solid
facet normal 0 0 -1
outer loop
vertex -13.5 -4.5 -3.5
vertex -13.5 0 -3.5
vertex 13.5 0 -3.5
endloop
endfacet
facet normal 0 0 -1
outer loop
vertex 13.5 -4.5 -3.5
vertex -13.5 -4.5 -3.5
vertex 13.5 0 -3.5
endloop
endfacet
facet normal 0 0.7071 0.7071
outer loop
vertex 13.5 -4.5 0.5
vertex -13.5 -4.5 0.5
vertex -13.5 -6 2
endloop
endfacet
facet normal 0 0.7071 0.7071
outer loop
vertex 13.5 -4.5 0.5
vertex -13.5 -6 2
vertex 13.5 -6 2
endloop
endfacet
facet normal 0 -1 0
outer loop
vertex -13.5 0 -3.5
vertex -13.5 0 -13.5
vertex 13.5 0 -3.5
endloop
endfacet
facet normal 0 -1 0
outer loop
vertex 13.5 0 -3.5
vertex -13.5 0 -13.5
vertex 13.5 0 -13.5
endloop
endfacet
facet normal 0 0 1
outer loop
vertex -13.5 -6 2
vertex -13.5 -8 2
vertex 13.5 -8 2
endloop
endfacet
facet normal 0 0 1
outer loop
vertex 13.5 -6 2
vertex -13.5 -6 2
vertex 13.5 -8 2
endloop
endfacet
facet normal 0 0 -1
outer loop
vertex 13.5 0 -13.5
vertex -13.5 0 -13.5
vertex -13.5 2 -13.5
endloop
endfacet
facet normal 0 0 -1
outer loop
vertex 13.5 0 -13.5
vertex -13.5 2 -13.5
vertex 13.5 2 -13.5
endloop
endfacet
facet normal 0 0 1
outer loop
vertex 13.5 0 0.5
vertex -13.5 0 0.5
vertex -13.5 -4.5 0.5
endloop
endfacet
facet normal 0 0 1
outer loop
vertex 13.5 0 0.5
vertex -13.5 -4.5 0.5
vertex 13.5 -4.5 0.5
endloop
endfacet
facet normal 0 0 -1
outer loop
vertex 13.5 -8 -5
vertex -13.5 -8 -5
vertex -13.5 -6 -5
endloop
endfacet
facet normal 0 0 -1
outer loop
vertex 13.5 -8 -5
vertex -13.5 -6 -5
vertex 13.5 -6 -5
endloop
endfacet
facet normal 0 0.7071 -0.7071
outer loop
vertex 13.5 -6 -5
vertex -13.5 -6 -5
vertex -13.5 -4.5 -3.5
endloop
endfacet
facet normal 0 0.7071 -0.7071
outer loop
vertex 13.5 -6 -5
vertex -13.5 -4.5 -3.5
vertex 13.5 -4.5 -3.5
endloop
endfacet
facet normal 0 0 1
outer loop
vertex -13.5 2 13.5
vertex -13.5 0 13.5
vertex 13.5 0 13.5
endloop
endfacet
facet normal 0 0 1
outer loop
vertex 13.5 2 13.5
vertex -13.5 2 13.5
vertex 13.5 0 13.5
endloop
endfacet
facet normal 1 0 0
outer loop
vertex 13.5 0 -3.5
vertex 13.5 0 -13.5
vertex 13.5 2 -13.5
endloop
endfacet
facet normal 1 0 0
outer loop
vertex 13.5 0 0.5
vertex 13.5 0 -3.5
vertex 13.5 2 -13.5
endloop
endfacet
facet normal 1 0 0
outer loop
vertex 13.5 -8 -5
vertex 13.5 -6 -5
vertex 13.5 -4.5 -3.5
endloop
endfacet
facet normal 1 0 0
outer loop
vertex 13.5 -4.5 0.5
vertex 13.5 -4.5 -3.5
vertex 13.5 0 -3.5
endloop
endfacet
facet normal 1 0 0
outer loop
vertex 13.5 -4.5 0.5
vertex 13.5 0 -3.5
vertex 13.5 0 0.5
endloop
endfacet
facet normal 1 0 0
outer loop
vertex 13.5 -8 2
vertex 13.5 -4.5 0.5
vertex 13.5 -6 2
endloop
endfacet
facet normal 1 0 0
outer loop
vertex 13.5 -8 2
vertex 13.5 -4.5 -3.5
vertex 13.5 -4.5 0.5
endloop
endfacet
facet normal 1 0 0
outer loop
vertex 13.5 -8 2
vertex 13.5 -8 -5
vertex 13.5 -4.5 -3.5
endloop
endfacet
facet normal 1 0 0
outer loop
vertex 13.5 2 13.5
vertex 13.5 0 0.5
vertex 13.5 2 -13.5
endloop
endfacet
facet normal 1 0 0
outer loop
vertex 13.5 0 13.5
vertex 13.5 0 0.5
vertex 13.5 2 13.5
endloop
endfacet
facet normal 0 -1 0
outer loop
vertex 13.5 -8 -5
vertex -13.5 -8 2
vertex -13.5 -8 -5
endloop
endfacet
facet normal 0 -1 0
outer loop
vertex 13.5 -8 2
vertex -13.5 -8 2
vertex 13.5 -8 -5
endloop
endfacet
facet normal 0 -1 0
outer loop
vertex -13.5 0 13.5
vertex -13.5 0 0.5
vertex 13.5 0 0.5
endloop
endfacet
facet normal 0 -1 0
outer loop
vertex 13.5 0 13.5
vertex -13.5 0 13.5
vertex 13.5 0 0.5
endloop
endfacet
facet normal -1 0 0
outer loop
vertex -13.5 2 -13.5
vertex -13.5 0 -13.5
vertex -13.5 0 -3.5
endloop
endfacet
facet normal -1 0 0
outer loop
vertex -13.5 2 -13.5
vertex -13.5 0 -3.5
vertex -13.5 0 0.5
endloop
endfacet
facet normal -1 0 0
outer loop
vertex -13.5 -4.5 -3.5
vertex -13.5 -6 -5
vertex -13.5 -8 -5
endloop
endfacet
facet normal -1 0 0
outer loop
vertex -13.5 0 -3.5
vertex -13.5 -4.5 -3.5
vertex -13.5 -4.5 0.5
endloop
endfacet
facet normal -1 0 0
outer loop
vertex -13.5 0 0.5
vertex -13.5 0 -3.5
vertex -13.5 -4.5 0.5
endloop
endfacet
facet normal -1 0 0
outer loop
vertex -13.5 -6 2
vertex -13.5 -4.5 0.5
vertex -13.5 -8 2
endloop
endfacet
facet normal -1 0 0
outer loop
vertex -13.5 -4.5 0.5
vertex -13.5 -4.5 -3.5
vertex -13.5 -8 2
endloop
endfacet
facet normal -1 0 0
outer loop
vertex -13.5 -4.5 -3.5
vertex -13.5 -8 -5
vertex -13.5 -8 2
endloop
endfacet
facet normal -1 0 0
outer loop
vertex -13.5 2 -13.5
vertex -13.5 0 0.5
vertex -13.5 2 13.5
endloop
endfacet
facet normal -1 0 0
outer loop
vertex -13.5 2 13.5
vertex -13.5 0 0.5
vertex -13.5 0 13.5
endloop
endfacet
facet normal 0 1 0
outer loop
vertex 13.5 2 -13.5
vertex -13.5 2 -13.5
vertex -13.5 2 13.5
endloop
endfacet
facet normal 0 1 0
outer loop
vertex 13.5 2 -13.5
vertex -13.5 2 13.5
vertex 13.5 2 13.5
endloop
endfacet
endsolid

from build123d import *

# Parameters (mm, degrees)
SKETCH1_W           = 27
SKETCH1_H           = 27
BOSS_EXTRUDE1_DEPTH = 2
SKETCH2_W           = 27
SKETCH2_H           = 4
BOSS_EXTRUDE2_DEPTH = 8
SKETCH3_W           = 27
SKETCH3_H           = 7
BOSS_EXTRUDE3_DEPTH = 2
CHAMFER1_SIZE       = 1.5


with BuildPart() as part:
    # Sketch1 → Boss-Extrude1 (new body)
    with BuildSketch(Plane(origin=(0, 0, 0), x_dir=(1, 0, 0), z_dir=(0, 1, 0))):
        Rectangle(SKETCH1_W, SKETCH1_H)
    extrude(amount=BOSS_EXTRUDE1_DEPTH)

    # Sketch2 → Boss-Extrude2 (add)
    with BuildSketch(Plane.XZ):
        with Locations((0, -1.5)):
            Rectangle(SKETCH2_W, SKETCH2_H)
    extrude(amount=BOSS_EXTRUDE2_DEPTH)

    # Sketch3 → Boss-Extrude3 (add)
    with BuildSketch(Plane.XZ.offset(8)):
        with Locations((0, -1.5)):
            Rectangle(SKETCH3_W, SKETCH3_H)
    extrude(amount=-BOSS_EXTRUDE3_DEPTH)

    # Chamfer1
    chamfer1_edges = [part.edges().sort_by_distance(p)[0] for p in [
        (0, -6, -3.5),
        (0, -6, 0.5),
    ]]
    chamfer(chamfer1_edges, length=CHAMFER1_SIZE - 0.0001)  # a hair under: the kernel refuses the full size


solid = part.part
